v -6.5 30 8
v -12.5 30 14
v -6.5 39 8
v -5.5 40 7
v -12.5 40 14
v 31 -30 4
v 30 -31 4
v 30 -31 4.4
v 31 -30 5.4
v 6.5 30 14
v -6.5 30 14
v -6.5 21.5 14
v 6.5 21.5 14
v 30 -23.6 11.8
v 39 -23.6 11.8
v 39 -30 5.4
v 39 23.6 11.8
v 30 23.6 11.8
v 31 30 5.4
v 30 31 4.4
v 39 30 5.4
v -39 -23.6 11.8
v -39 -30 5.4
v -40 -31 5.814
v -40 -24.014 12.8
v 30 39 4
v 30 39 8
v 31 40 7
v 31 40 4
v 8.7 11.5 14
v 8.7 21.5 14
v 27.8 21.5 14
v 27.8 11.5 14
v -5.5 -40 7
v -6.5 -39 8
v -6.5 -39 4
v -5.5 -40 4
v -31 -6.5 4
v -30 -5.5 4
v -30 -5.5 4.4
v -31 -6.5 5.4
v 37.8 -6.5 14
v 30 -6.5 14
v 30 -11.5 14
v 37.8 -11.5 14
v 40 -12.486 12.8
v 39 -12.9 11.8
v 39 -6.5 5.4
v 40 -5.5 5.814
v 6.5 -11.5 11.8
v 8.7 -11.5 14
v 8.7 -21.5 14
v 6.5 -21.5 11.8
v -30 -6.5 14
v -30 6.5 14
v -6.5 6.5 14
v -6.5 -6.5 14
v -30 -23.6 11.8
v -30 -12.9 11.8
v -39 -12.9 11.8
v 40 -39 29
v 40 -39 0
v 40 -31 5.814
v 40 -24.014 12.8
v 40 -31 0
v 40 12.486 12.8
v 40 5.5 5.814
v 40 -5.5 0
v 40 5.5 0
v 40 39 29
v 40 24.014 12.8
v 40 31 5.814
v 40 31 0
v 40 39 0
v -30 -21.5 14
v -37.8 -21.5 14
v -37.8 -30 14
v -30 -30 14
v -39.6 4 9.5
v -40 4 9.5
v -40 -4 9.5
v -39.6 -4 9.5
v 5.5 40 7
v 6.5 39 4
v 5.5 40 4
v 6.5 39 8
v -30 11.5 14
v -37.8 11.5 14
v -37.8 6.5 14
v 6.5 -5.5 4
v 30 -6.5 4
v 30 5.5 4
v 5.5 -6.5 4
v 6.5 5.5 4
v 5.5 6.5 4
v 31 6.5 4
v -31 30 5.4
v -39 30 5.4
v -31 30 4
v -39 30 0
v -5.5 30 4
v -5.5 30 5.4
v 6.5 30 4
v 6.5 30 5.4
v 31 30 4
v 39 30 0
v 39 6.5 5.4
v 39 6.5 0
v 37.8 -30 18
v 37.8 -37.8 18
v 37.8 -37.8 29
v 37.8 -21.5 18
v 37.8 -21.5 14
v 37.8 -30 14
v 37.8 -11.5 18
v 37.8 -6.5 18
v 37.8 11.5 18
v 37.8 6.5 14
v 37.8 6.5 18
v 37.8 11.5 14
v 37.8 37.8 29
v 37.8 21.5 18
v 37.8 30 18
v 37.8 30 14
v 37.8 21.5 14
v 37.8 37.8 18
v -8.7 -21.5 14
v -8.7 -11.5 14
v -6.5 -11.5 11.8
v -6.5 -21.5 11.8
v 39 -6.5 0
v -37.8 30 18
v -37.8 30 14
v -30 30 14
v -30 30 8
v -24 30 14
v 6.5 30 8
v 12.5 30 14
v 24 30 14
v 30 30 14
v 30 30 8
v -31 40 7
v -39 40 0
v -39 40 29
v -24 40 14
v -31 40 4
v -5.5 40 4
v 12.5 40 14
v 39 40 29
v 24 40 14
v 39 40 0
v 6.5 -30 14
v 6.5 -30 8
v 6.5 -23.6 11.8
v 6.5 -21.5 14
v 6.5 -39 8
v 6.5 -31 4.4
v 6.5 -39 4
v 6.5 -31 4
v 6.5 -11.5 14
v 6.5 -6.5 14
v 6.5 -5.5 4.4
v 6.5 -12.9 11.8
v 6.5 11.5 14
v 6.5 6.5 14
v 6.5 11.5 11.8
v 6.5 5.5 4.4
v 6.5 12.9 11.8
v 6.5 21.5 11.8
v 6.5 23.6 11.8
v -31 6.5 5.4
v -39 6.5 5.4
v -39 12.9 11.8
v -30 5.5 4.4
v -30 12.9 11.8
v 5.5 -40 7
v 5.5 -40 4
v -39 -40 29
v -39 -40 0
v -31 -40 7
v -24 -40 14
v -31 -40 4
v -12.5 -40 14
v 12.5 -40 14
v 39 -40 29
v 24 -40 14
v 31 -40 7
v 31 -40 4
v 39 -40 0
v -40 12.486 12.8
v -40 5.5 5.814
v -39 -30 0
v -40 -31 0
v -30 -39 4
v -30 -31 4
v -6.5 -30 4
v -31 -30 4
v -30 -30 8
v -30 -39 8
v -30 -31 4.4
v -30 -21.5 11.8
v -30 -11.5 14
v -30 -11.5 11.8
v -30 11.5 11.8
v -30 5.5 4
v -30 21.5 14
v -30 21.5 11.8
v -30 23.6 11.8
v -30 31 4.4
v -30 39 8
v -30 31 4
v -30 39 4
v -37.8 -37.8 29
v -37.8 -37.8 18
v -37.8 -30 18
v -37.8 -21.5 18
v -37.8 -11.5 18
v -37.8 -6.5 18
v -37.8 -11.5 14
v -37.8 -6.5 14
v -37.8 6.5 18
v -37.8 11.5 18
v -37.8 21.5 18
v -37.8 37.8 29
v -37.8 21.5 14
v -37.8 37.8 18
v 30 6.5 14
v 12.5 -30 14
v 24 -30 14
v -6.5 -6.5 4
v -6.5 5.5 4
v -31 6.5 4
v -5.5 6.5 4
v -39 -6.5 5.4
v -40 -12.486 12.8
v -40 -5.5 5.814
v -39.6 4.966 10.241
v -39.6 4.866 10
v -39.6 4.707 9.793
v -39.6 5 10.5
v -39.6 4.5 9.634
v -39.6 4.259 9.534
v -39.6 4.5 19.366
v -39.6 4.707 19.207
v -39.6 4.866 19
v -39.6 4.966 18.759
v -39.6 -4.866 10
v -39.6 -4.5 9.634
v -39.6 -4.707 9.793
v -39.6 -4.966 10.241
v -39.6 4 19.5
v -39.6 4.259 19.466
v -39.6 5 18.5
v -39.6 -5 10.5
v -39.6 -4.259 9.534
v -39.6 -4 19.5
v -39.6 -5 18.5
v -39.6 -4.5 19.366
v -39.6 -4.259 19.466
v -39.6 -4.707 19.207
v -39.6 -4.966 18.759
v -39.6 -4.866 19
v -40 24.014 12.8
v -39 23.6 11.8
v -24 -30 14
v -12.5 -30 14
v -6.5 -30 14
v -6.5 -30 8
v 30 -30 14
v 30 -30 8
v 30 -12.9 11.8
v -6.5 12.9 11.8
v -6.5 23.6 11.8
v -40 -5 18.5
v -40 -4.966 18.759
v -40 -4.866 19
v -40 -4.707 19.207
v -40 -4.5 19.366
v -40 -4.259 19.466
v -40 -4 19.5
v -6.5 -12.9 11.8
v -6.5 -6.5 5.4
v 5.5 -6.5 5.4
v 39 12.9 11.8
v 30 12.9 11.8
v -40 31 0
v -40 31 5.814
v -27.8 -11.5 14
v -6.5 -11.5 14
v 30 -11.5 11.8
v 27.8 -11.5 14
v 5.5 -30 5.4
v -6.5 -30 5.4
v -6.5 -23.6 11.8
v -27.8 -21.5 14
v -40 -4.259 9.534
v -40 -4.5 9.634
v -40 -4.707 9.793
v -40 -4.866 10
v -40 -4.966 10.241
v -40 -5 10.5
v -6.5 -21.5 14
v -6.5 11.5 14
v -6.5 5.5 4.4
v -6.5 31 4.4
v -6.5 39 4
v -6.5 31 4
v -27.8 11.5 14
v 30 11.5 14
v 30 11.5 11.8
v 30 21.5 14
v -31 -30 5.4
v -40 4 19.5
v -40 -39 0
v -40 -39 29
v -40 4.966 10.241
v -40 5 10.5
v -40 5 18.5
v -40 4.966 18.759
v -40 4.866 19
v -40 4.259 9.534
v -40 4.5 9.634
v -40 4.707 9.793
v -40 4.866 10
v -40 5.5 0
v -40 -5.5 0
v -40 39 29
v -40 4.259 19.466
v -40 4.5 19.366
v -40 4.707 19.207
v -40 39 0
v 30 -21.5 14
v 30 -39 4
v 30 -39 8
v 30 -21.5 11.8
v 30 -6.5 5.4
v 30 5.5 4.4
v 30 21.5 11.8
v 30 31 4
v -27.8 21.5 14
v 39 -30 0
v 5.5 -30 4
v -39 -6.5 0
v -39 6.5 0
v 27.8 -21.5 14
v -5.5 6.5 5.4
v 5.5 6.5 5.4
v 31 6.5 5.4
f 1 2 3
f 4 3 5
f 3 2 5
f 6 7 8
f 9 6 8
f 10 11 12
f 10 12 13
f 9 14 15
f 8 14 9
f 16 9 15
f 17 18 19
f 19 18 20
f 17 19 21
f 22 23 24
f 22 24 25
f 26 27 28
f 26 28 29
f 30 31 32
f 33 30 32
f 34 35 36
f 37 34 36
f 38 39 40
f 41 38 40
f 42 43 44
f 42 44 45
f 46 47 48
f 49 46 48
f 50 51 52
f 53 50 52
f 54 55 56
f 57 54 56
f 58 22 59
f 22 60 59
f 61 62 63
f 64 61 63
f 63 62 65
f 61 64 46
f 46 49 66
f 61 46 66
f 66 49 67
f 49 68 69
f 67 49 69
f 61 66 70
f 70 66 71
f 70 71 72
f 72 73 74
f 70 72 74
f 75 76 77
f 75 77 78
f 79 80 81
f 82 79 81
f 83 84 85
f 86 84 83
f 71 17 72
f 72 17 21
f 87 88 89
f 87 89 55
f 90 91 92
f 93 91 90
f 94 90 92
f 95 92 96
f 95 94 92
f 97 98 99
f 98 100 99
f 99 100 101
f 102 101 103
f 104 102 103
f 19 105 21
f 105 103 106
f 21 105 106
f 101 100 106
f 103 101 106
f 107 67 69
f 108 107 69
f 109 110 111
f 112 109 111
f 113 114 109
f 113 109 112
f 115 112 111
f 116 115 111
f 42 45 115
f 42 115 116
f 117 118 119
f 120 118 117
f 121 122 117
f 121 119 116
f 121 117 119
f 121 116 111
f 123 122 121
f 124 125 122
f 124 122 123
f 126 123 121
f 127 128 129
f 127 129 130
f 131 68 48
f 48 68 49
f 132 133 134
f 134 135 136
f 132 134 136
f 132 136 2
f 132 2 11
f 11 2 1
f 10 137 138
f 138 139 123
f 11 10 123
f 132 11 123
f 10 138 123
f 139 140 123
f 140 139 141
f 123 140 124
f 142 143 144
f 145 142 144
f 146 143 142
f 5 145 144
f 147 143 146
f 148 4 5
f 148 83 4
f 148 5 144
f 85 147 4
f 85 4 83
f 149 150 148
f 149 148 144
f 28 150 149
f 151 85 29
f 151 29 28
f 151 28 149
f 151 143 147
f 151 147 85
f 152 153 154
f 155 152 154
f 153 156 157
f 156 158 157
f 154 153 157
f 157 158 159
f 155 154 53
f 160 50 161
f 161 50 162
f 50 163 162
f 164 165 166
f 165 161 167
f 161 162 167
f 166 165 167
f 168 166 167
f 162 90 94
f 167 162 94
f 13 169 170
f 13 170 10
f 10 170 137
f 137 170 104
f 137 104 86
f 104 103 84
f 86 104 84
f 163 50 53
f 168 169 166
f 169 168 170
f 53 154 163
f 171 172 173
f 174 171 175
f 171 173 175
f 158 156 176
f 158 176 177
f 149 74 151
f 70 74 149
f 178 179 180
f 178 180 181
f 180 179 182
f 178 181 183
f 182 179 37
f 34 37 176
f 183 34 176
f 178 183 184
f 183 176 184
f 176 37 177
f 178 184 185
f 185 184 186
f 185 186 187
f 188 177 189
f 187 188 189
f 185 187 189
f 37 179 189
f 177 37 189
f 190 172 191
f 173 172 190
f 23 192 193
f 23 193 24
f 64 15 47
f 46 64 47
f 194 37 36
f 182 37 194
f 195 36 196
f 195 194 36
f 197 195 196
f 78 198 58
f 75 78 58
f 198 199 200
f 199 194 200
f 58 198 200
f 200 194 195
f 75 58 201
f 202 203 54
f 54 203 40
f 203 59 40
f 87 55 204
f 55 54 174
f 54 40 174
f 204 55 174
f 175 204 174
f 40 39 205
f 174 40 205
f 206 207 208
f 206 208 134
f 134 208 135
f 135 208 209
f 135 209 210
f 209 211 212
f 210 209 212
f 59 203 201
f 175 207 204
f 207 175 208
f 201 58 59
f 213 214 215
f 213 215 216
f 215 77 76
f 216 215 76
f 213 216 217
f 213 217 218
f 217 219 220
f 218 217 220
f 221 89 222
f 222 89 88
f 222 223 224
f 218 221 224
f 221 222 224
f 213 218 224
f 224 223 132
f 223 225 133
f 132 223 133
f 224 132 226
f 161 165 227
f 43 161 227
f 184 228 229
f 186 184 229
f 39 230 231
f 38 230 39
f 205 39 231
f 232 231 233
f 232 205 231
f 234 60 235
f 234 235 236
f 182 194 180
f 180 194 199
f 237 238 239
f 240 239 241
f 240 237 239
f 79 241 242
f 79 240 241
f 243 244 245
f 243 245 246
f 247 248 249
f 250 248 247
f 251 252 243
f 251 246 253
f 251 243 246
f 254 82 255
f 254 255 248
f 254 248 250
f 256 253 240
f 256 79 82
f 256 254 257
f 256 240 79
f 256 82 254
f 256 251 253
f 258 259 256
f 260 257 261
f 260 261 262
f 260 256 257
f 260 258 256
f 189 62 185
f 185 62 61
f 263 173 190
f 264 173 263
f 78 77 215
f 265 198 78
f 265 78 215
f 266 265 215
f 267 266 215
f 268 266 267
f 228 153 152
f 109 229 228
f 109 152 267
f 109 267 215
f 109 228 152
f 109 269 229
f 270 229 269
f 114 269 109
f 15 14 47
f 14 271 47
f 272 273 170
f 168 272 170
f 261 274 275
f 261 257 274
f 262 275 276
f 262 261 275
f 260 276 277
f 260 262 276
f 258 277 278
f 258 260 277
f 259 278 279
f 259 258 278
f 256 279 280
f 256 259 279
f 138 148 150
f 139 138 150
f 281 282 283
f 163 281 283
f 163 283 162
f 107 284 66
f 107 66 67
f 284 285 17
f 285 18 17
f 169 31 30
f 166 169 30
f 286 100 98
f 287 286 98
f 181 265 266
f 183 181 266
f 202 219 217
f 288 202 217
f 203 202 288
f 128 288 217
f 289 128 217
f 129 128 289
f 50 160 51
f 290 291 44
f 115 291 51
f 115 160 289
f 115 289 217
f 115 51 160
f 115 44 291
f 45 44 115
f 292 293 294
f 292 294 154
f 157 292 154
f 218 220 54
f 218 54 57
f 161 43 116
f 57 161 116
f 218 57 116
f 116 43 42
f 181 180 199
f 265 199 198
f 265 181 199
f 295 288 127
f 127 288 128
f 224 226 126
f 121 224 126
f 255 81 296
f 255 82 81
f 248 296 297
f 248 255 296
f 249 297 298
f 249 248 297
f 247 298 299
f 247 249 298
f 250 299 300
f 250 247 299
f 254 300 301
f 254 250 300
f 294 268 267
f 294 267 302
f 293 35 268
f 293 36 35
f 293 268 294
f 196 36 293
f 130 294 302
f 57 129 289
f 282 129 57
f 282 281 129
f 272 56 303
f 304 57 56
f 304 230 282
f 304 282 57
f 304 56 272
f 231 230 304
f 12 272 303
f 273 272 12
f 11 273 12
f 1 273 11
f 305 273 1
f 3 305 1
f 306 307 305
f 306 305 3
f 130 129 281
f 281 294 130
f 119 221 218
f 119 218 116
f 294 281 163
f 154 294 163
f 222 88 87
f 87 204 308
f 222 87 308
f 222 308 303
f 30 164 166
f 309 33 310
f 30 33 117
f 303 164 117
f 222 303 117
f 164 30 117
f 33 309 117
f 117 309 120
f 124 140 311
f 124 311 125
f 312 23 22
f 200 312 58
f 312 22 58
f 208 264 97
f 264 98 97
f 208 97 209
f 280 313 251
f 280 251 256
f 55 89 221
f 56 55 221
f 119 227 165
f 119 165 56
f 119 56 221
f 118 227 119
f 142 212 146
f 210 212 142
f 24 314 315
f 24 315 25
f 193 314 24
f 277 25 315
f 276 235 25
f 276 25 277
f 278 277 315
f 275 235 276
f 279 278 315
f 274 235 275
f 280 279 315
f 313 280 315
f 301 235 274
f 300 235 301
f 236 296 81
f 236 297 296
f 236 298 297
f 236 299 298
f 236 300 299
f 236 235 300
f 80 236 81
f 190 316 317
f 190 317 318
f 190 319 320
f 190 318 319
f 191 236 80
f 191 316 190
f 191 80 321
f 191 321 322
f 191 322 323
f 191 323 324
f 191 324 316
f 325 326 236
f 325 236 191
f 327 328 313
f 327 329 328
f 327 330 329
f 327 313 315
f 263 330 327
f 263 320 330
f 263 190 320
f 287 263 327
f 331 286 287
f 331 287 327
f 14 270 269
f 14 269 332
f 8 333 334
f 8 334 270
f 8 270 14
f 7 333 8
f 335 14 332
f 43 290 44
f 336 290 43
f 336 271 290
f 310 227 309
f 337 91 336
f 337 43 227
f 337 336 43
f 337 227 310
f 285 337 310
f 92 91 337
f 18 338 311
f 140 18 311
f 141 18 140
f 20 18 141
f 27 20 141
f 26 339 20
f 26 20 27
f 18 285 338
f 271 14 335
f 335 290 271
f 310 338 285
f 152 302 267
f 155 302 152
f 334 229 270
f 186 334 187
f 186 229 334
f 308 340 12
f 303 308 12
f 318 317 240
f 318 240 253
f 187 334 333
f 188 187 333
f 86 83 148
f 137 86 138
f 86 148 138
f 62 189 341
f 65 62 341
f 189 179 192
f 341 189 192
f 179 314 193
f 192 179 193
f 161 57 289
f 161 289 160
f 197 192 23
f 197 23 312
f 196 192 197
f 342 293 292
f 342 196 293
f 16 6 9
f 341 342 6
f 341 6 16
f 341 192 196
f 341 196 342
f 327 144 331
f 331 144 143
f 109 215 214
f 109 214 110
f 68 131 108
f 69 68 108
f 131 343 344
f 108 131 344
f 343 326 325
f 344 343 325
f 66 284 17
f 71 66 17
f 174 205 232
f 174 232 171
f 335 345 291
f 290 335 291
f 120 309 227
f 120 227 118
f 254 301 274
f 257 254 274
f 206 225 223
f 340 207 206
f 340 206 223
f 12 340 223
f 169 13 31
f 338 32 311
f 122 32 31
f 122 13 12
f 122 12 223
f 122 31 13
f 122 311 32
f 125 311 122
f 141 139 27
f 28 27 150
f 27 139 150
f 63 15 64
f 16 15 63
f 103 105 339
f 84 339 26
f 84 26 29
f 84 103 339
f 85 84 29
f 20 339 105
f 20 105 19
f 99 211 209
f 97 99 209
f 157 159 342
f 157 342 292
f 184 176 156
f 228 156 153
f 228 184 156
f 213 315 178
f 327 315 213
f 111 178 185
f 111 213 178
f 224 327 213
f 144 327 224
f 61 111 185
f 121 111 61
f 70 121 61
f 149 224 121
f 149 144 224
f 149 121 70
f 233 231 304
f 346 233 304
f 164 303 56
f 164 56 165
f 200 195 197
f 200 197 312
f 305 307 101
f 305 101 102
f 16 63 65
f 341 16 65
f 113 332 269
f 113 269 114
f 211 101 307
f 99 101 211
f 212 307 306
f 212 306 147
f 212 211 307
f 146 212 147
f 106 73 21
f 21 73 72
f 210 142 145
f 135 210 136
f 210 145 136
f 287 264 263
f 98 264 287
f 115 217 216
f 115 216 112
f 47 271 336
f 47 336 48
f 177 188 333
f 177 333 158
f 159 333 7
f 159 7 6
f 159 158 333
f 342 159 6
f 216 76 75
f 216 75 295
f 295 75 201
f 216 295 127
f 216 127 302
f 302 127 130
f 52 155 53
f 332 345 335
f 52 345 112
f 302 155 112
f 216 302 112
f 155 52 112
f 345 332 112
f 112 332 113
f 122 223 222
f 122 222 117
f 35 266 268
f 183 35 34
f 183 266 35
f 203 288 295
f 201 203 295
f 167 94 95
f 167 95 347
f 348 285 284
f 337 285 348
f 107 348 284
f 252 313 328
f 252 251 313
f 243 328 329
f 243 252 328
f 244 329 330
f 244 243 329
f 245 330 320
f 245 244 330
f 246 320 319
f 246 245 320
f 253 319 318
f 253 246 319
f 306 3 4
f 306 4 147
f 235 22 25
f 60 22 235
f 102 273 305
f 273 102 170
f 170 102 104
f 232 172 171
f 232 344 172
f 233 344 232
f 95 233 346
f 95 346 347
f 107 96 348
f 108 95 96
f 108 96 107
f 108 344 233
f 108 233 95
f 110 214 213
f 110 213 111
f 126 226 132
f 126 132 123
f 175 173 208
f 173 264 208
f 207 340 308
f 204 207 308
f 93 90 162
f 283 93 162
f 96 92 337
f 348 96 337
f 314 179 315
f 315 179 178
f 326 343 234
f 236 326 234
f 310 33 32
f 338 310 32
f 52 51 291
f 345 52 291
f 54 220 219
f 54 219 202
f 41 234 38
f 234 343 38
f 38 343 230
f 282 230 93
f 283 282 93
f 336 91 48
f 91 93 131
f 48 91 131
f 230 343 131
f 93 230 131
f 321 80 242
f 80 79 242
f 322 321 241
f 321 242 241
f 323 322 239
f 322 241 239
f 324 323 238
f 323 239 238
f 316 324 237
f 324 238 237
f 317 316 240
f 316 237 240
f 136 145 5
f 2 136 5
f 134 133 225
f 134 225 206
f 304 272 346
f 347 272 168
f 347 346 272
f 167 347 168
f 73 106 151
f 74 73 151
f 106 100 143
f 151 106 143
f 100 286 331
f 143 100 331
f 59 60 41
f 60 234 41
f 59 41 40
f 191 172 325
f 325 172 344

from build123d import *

# Parameters (mm, degrees)
CROQUIS1_W                = 13
CROQUIS1_H                = 80
SALIENTE_EXTRUIR1_DEPTH   = 4
CROQUIS1_W_2              = 10
SALIENTE_EXTRUIR1_2_DEPTH = 4
SALIENTE_EXTRUIR1_3_DEPTH = 4
CROQUIS2_W                = 13
CROQUIS2_H                = 13
CROQUIS2_W_2              = 10
CROQUIS2_H_2              = 10
SALIENTE_EXTRUIR2_DEPTH   = 10
CROQUIS3_W                = 13
CROQUIS3_H                = 80
CROQUIS3_W_2              = 10
SALIENTE_EXTRUIR3_DEPTH   = 2.2
CROQUIS4_W                = 80
CROQUIS4_H                = 10
CROQUIS4_H_2              = 13
SALIENTE_EXTRUIR4_DEPTH   = 4
CROQUIS5_W                = 80
CROQUIS5_H                = 80
CROQUIS5_W_2              = 75.6
CROQUIS5_H_2              = 75.6
SALIENTE_EXTRUIR5_DEPTH   = 15
CHAFL_N2_SIZE             = 6.4
CHAFL_N3_SIZE             = 6
CHAFL_N4_SIZE             = 2.2
CROQUIS6_W                = 10
CROQUIS6_H                = 10
CORTAR_EXTRUIR1_DEPTH     = 0.4
REDONDEO1_R               = 1
CHAFL_N1_SIZE             = 1


with BuildPart() as part:
    # Croquis1 → Saliente-Extruir1 (new body)
    with BuildSketch(Plane(origin=(0, 0, 0), x_dir=(0, 1, 0), z_dir=(0, 0, 1))):
        Rectangle(CROQUIS1_W, CROQUIS1_H)
    extrude(amount=SALIENTE_EXTRUIR1_DEPTH)



with BuildPart() as body_2:
    # Croquis1 → Saliente-Extruir1 2 (new body)
    with BuildSketch(Plane(origin=(0, 0, 0), x_dir=(0, 1, 0), z_dir=(0, 0, 1))):
        with Locations((35, 0)):
            Rectangle(CROQUIS1_W_2, CROQUIS1_H)
    extrude(amount=SALIENTE_EXTRUIR1_2_DEPTH)


with BuildPart() as body_3:
    # Croquis1 → Saliente-Extruir1 3 (new body)
    with BuildSketch(Plane(origin=(0, 0, 0), x_dir=(0, 1, 0), z_dir=(0, 0, 1))):
        with Locations((-35, 0)):
            Rectangle(CROQUIS1_W_2, CROQUIS1_H)
    extrude(amount=SALIENTE_EXTRUIR1_3_DEPTH)


with BuildPart() as part_1:
    add(part.part)

    add(body_2.part)  # Saliente-Extruir2 merges body 2

    add(body_3.part)  # Saliente-Extruir2 merges body 3
    # Croquis2 → Saliente-Extruir2 (add)
    with BuildSketch(Plane.XY.offset(4)):
        Rectangle(CROQUIS2_W, CROQUIS2_H)
        with Locations((-35, 0)):
            Rectangle(CROQUIS2_W_2, CROQUIS2_H)
        with Locations((35, 0)):
            Rectangle(CROQUIS2_W_2, CROQUIS2_H)
        with Locations((0, 35)):
            Rectangle(CROQUIS2_W, CROQUIS2_H_2)
        with Locations((-35, 35)):
            Rectangle(CROQUIS2_W_2, CROQUIS2_H_2)
        with Locations((35, 35)):
            Rectangle(CROQUIS2_W_2, CROQUIS2_H_2)
        with Locations((35, -35)):
            Rectangle(CROQUIS2_W_2, CROQUIS2_H_2)
        with Locations((-35, -35)):
            Rectangle(CROQUIS2_W_2, CROQUIS2_H_2)
        with Locations((0, -35)):
            Rectangle(CROQUIS2_W, CROQUIS2_H_2)
    extrude(amount=SALIENTE_EXTRUIR2_DEPTH)

    # Croquis3 → Saliente-Extruir3 (add)
    with BuildSketch(Plane.XY.offset(14)):
        Rectangle(CROQUIS3_W, CROQUIS3_H)
        with Locations((-35, 0)):
            Rectangle(CROQUIS3_W_2, CROQUIS3_H)
        with Locations((35, 0)):
            Rectangle(CROQUIS3_W_2, CROQUIS3_H)
    extrude(amount=-SALIENTE_EXTRUIR3_DEPTH)

    # Croquis4 → Saliente-Extruir4 (add)
    with BuildSketch(Plane.XY.offset(14)):
        with Locations((0, -35)):
            Rectangle(CROQUIS4_W, CROQUIS4_H)
        Rectangle(CROQUIS4_W, CROQUIS4_H_2)
        with Locations((0, 35)):
            Rectangle(CROQUIS4_W, CROQUIS4_H)
        with Locations((0, 16.5)):
            Rectangle(CROQUIS4_W, CROQUIS4_H)
        with Locations((0, -16.5)):
            Rectangle(CROQUIS4_W, CROQUIS4_H)
    extrude(amount=SALIENTE_EXTRUIR4_DEPTH)

    # Croquis5 → Saliente-Extruir5 (add)
    with BuildSketch(Plane.XY.offset(14)):
        Rectangle(CROQUIS5_W, CROQUIS5_H)
        Rectangle(CROQUIS5_W_2, CROQUIS5_H_2, mode=Mode.SUBTRACT)
    extrude(amount=SALIENTE_EXTRUIR5_DEPTH)

    # Chaflán2
    chafl_n2_edges = [part_1.edges().sort_by_distance(p)[0] for p in [
        (0, -30, 11.8),
        (-35, 6.5, 11.8),
        (-35, -6.5, 11.8),
        (-35, 30, 11.8),
        (-35, -30, 11.8),
        (35, 6.5, 11.8),
        (35, 30, 11.8),
        (35, -6.5, 11.8),
        (35, -30, 11.8),
        (0, 6.5, 11.8),
        (0, -6.5, 11.8),
        (0, 30, 11.8),
    ]]
    chamfer(chafl_n2_edges, length=CHAFL_N2_SIZE)

    # Chaflán3
    chafl_n3_edges = [part_1.edges().sort_by_distance(p)[0] for p in [
        (-6.5, -35, 14),
        (30, -35, 14),
        (6.5, 35, 14),
        (-30, 35, 14),
        (6.5, -35, 14),
        (-6.5, 35, 14),
        (-30, -35, 14),
        (30, 35, 14),
    ]]
    chamfer(chafl_n3_edges, length=CHAFL_N3_SIZE)

    # Chaflán4
    chafl_n4_edges = [part_1.edges().sort_by_distance(p)[0] for p in [
        (30, 16.5, 14),
        (30, -16.5, 14),
        (6.5, -16.5, 14),
        (-6.5, -16.5, 14),
        (-30, -16.5, 14),
        (6.5, 16.5, 14),
        (-30, 16.5, 14),
    ]]
    chamfer(chafl_n4_edges, length=CHAFL_N4_SIZE - 0.0001)  # a hair under: the kernel refuses the full size

    # Croquis6 → Cortar-Extruir1 (cut)
    with BuildSketch(Plane(origin=(-40, 0, 0), x_dir=(0, -1, 0), z_dir=(-1, 0, 0))):
        with Locations((0, 14.5)):
            Rectangle(CROQUIS6_W, CROQUIS6_H)
    extrude(amount=-CORTAR_EXTRUIR1_DEPTH, mode=Mode.SUBTRACT)

    # Redondeo1
    redondeo1_edges = [part_1.edges().sort_by_distance(p)[0] for p in [
        (-39.8, -5, 19.5),
        (-39.8, -5, 9.5),
        (-39.8, 5, 9.5),
        (-39.8, 5, 19.5),
    ]]
    fillet(redondeo1_edges, radius=REDONDEO1_R)

    # Chaflán1
    chafl_n1_edges = [part_1.edges().sort_by_distance(p)[0] for p in [
        (-40, 40, 14.5),
        (-40, -40, 14.5),
        (40, -40, 14.5),
        (40, 6.5, 2.7),
        (-40, 6.5, 2.7),
        (-30, 6.5, 4.7),
        (-6.5, 6.5, 4.7),
        (6.5, 6.5, 4.7),
        (30, 6.5, 4.7),
        (6.5, -6.5, 4.7),
        (-30, -6.5, 4.7),
        (-40, -6.5, 2.7),
        (40, -6.5, 2.7),
        (-40, -18.25, 11.8),
        (30, 30, 4.7),
        (-6.5, 30, 4.7),
        (-30, 30, 4.7),
        (-40, 30, 2.7),
        (40, 30, 2.7),
        (-40, 18.25, 11.8),
        (40, -30, 2.7),
        (-40, -30, 2.7),
        (-30, -30, 4.7),
        (6.5, -30, 4.7),
        (30, -30, 4.7),
        (40, 18.25, 11.8),
        (40, -18.25, 11.8),
        (-40, -9.7, 8.6),
        (-40, 26.8, 8.6),
        (-40, 9.7, 8.6),
        (-40, -26.8, 8.6),
        (40, 9.7, 8.6),
        (40, 26.8, 8.6),
        (40, -9.7, 8.6),
        (40, -26.8, 8.6),
        (30, 40, 6),
        (30, -40, 6),
        (-30, 40, 6),
        (-30, -40, 6),
        (6.5, 40, 6),
        (-6.5, -40, 6),
        (6.5, -40, 6),
        (-6.5, 40, 6),
        (40, 40, 14.5),
    ]]
    chamfer(chafl_n1_edges, length=CHAFL_N1_SIZE)


solid = part_1.part
